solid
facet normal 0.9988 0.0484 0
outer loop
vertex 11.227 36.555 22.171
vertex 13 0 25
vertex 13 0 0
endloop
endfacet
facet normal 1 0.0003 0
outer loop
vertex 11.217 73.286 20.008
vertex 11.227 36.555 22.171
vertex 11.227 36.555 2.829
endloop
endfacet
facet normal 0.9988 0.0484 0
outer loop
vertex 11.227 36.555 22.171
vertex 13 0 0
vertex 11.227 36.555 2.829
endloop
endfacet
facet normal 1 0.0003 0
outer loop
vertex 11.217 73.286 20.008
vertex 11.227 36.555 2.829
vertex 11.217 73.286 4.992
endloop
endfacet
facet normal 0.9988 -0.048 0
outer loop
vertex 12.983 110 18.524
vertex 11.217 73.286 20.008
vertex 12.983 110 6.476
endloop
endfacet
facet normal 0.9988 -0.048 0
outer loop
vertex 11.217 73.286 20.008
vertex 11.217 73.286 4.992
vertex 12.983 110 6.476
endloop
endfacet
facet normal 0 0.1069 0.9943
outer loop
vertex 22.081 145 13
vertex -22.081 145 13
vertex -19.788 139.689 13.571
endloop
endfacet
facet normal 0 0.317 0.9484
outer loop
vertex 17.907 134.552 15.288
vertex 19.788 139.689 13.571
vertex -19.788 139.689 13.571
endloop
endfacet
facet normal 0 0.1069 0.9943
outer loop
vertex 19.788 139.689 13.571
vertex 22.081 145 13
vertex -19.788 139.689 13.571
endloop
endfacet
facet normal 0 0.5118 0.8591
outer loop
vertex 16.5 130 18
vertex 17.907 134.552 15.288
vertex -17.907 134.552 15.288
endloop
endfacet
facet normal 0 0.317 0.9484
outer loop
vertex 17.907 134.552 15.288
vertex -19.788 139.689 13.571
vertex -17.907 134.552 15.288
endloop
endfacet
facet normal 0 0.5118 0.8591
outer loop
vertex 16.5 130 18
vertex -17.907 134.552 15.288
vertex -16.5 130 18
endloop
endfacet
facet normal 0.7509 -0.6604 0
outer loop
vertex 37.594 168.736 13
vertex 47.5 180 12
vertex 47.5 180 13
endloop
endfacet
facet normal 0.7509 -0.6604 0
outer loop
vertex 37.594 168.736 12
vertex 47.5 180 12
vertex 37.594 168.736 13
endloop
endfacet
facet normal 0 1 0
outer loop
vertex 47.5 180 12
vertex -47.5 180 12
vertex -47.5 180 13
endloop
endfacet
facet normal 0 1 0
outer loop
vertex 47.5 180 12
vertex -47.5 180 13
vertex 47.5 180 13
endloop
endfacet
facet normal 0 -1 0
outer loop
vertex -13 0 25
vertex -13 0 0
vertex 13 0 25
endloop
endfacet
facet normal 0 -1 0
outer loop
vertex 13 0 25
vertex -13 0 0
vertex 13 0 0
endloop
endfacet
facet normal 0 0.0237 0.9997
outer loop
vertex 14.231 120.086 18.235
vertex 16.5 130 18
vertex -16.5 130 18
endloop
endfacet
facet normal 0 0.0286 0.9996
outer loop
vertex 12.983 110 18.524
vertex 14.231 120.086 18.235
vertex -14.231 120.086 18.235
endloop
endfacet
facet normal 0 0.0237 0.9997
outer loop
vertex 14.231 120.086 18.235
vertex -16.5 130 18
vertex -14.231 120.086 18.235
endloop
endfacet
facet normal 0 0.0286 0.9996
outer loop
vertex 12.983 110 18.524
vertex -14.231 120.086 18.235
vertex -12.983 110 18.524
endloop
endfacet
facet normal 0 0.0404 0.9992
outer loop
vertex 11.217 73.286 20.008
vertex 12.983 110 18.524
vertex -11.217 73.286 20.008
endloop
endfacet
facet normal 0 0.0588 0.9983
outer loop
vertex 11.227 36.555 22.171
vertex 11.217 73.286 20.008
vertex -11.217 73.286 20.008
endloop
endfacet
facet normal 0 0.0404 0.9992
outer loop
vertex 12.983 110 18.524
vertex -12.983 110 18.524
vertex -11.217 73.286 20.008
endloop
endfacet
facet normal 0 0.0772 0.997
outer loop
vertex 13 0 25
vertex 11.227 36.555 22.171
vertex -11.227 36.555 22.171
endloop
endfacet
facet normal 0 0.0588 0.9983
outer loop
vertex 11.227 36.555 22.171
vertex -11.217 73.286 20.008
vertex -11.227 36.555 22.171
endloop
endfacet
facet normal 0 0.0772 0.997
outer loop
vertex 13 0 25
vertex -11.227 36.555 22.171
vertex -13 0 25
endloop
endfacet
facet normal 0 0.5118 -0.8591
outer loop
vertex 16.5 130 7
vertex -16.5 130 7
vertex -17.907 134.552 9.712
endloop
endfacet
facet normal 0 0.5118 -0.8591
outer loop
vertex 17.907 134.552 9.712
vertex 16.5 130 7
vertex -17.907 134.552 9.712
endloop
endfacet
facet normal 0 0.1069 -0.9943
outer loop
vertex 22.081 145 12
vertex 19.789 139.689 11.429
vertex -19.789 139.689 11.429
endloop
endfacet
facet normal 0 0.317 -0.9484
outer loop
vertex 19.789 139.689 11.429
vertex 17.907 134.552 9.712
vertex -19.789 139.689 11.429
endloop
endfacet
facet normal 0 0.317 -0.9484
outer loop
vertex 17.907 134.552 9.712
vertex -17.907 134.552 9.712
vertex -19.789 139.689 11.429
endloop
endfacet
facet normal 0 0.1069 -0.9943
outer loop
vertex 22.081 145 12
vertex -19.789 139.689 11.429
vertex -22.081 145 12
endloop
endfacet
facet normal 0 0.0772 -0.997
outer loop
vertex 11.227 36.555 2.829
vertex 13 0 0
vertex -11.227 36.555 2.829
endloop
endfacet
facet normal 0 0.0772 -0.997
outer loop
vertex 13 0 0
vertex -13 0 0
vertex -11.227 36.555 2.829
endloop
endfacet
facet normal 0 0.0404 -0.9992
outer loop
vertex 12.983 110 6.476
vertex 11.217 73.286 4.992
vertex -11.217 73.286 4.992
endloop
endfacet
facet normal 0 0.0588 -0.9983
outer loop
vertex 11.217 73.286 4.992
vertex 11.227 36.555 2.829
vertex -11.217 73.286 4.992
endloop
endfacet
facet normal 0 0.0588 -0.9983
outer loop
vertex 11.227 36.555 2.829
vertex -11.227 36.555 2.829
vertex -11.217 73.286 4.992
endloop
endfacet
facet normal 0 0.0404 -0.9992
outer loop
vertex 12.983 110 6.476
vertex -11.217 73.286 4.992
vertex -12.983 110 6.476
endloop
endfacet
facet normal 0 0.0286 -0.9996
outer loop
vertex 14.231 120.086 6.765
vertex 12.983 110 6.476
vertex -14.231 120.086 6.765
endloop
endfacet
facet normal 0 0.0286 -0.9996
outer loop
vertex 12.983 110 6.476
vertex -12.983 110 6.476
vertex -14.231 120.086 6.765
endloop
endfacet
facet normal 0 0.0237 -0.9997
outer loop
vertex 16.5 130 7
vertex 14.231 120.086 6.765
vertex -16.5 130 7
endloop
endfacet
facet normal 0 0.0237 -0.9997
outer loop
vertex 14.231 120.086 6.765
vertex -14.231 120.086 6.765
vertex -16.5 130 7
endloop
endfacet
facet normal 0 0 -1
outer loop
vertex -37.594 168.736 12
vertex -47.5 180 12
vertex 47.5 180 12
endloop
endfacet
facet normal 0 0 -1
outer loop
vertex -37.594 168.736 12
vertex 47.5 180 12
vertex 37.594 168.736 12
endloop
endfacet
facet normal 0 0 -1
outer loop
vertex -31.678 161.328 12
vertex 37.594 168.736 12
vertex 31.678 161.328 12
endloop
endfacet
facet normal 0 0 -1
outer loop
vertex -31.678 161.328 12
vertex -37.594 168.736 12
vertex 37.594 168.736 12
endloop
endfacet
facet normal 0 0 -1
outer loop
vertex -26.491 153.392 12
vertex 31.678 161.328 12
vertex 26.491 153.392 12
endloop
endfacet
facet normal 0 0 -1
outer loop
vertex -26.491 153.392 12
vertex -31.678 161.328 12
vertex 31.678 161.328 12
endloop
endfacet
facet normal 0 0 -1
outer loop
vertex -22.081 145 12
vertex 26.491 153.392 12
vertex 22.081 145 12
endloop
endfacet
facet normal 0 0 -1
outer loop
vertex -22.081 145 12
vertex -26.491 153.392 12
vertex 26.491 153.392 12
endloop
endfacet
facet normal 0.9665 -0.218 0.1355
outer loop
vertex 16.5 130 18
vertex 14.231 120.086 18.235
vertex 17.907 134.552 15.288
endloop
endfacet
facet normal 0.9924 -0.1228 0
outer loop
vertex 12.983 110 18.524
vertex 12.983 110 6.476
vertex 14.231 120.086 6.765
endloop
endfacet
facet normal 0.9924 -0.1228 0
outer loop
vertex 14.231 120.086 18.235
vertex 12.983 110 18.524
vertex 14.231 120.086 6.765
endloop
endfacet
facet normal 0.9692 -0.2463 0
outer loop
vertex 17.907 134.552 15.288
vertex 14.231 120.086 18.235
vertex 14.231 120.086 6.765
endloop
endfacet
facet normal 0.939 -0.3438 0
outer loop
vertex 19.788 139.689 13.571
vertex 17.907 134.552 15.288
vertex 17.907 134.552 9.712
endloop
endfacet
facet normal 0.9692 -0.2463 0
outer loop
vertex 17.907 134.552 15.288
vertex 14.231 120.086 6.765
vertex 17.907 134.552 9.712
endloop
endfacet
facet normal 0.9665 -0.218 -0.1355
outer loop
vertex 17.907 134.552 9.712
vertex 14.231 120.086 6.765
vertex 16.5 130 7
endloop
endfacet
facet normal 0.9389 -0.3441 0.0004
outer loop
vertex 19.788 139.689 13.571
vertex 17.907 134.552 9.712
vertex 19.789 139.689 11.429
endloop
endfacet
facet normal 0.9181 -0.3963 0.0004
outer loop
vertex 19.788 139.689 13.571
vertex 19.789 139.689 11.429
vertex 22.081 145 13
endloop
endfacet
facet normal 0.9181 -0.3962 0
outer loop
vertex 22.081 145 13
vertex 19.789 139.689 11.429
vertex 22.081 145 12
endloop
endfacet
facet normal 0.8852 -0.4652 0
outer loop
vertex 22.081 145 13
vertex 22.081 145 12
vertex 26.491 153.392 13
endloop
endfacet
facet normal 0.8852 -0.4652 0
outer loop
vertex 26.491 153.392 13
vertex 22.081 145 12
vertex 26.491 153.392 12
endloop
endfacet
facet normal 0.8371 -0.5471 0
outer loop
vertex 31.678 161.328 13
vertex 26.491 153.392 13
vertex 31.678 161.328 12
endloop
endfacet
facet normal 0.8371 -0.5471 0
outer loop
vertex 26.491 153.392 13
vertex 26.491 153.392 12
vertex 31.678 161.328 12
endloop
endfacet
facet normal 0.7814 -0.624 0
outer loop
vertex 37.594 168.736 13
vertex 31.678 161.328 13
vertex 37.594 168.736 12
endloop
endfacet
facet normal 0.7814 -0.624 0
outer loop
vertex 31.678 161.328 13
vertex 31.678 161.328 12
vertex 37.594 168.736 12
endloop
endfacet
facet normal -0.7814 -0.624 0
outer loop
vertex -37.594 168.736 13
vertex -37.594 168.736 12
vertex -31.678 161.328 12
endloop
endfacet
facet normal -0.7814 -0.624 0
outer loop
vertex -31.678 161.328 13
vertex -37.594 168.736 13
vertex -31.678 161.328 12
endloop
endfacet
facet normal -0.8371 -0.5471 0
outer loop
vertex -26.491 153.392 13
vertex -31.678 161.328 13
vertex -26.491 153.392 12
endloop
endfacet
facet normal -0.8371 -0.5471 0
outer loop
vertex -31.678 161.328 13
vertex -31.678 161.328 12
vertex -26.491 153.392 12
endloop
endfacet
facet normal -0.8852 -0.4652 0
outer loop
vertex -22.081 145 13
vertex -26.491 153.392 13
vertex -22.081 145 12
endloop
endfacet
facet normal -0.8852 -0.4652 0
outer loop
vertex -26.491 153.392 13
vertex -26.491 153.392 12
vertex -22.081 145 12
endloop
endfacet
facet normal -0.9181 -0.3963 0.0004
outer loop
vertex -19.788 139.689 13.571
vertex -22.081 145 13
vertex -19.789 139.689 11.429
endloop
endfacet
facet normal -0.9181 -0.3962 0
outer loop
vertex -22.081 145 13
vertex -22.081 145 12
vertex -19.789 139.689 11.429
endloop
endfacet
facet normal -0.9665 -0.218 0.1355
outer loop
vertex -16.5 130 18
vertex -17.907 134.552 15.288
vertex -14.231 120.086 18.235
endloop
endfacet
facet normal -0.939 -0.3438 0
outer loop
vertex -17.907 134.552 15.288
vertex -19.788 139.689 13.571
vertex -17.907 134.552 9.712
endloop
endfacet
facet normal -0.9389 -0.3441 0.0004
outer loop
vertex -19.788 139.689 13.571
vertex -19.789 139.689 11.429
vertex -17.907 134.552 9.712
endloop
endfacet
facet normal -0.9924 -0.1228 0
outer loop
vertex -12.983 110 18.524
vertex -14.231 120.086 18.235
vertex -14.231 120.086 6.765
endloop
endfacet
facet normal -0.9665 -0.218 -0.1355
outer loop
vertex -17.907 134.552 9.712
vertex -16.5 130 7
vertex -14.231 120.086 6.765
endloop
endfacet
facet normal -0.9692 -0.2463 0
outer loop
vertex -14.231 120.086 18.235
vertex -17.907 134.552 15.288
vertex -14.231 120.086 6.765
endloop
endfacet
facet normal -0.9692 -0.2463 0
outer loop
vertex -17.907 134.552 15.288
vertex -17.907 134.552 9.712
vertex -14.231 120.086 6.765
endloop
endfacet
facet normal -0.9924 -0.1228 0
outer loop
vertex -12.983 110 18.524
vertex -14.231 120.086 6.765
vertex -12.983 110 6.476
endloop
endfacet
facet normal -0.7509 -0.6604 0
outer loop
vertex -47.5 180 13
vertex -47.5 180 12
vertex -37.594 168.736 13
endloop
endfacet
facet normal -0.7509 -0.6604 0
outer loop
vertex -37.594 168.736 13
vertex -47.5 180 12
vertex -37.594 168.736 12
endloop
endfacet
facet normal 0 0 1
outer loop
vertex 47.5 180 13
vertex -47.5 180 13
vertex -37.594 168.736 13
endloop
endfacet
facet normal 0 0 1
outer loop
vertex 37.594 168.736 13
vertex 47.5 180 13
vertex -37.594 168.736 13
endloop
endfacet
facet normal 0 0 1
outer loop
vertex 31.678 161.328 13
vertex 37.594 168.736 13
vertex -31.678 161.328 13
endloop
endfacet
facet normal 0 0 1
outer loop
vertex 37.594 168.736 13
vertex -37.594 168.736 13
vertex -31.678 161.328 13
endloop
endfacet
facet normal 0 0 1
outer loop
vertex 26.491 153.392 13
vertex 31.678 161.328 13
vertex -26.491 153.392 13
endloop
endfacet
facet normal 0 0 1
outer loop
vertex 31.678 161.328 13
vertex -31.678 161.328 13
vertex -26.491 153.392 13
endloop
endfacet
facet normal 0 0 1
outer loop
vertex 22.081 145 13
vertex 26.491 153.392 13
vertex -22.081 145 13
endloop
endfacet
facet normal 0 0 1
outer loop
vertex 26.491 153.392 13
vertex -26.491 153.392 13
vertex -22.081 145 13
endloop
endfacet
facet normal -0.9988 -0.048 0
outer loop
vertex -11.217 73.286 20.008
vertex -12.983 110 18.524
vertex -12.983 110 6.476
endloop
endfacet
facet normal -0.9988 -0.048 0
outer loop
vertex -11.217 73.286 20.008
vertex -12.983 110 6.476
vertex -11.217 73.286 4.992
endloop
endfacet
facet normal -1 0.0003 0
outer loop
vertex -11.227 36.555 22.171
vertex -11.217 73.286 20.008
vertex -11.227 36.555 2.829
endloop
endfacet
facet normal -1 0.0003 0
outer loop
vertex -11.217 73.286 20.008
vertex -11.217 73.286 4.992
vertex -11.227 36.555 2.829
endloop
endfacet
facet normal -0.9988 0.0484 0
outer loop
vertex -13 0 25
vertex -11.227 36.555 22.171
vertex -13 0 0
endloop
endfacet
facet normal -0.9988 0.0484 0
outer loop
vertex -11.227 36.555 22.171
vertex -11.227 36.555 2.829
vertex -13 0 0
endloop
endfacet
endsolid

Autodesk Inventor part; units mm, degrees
ref_plane "YZ Plane" through (0, 0, 0) normal (1, 0, 0) x (0, 1, 0)
ref_plane "XZ Plane" through (0, 0, 0) normal (0, 1, 0) x (-1, 0, 0)
ref_plane "XY Plane" through (0, 0, 0) normal (0, 0, 1) x (1, 0, 0)
sketch "Эскиз1" plane through (0, 0, 0) normal (0, 0, 1) x (1, 0, 0)
  line L0 (-13, 0) -> (13, 0)
  line L1 (-47.5, 180) -> (47.5, 180)
  line L2 (-16.5, 130) -> (16.5, 130)
  line L3 (-12.9827, 110) -> (12.9827, 110)
  line L4 (-11.8003, 90) -> (11.8003, 90)
  line L5 (47.5, 180) -> (37.594, 168.7363)
  line L6 (-47.5, 180) -> (-37.594, 168.7363)
  line L7 (-37.594, 168.7363) -> (37.594, 168.7363)
  arc A0 (37.594, 168.7363) -> (12.9827, 110) centre (112.573, 102.7948) ccw
  arc A1 (12.9827, 110) -> (13, 0) centre (771.5375, 55.1194) ccw
  arc A2 (-12.9827, 110) -> (-37.594, 168.7363) centre (-112.573, 102.7948) ccw
  arc A3 (-13, 0) -> (-12.9827, 110) centre (-771.5375, 55.1194) ccw
  line L8 (-11, 80.4723) -> (-11, 26.1046)
  line L9 (11, 80.4723) -> (11, 26.1046)
  line L10 (-37.594, 168.7363) -> (13.0707, 111.1279)
  line L11 (37.594, 168.7363) -> (-13.0707, 111.1279)
  point P0 (0, 0)
  point P1 (0, 0)
  point P2 (0, 180)
  point P3 (0, 130)
  point P4 (0, 90)
  point P5 (0, 110)
  point P6 (-11, 55.1194)
  dimension "d0" = 26
  dimension "d1" = 95
  dimension "d2" = 33
  dimension "d5" = 180
  dimension "d6" = 50
  dimension "d7" = 20
  dimension "d8" = 20
  dimension "d9" = 15
  dimension "d10" = 15
  dimension "d13" = 22
  dimension "d19" = 55.1194
extrude "Выдавливание1" add sketch "Эскиз1" along normal blind 25
sketch "Эскиз2" plane through (0, 0, 0) normal (1, 0, 0) x (0, 1, 0)
  line L0 (0, 0) -> (110, 0) projected
  line L1 (110, 0) -> (110, 25) projected
  line L2 (0, 25) -> (110, 25) projected
  line L3 (0, 0) -> (0, 25) projected
  line L4 (110, 0) -> (169.3956, 0) projected
  line L5 (110, 25) -> (169.3956, 25) projected
  line L6 (110, 0) -> (110, 25) projected
  line L7 (130, 18) -> (130, 7)
  line L8 (55, 21) -> (55, 4)
  arc A0 (0, 25) -> (130, 18) centre (172.2556, 2013.3889) ccw
  arc A1 (130, 7) -> (0, 0) centre (172.2556, -1988.3889) ccw
  line L9 (180, 13) -> (180, 12)
  line L10 (145, 13) -> (145, 12)
  line L11 (180, 13) -> (145, 13)
  line L12 (180, 12) -> (145, 12)
  arc A2 (130, 18) -> (145, 13) centre (145, 38) ccw
  arc A3 (145, 12) -> (130, 7) centre (145, -13) ccw
  line L13 (168.7363, 0) -> (180, 0) projected
  line L14 (180, 0) -> (180, 25) projected
  line L15 (168.7363, 25) -> (180, 25) projected
  point P0 (130, 12.5)
  point P1 (0, 12.5)
  point P2 (55, 12.5)
  point P3 (180, 12.5)
  point P4 (169.3956, 12.5)
  point P5 (145, 12.5)
  point P6 (180, 12.5)
  dimension "d16" = 11
  dimension "d20" = 55
  dimension "d21" = 17
  dimension "d22" = 1
  dimension "d23" = 1
  dimension "d25" = 35
  dimension "d28" = 50
extrude "Выдавливание2" cut sketch "Эскиз2" along normal mid plane 100 contours L3 A0 L8 A1 | L8 A0 L1 A1 | L1 A0 L7 A1 | L7 A2 L10 A3 | L10 L11 L9 L12 keep common part
properties part number "bachi_v2"
